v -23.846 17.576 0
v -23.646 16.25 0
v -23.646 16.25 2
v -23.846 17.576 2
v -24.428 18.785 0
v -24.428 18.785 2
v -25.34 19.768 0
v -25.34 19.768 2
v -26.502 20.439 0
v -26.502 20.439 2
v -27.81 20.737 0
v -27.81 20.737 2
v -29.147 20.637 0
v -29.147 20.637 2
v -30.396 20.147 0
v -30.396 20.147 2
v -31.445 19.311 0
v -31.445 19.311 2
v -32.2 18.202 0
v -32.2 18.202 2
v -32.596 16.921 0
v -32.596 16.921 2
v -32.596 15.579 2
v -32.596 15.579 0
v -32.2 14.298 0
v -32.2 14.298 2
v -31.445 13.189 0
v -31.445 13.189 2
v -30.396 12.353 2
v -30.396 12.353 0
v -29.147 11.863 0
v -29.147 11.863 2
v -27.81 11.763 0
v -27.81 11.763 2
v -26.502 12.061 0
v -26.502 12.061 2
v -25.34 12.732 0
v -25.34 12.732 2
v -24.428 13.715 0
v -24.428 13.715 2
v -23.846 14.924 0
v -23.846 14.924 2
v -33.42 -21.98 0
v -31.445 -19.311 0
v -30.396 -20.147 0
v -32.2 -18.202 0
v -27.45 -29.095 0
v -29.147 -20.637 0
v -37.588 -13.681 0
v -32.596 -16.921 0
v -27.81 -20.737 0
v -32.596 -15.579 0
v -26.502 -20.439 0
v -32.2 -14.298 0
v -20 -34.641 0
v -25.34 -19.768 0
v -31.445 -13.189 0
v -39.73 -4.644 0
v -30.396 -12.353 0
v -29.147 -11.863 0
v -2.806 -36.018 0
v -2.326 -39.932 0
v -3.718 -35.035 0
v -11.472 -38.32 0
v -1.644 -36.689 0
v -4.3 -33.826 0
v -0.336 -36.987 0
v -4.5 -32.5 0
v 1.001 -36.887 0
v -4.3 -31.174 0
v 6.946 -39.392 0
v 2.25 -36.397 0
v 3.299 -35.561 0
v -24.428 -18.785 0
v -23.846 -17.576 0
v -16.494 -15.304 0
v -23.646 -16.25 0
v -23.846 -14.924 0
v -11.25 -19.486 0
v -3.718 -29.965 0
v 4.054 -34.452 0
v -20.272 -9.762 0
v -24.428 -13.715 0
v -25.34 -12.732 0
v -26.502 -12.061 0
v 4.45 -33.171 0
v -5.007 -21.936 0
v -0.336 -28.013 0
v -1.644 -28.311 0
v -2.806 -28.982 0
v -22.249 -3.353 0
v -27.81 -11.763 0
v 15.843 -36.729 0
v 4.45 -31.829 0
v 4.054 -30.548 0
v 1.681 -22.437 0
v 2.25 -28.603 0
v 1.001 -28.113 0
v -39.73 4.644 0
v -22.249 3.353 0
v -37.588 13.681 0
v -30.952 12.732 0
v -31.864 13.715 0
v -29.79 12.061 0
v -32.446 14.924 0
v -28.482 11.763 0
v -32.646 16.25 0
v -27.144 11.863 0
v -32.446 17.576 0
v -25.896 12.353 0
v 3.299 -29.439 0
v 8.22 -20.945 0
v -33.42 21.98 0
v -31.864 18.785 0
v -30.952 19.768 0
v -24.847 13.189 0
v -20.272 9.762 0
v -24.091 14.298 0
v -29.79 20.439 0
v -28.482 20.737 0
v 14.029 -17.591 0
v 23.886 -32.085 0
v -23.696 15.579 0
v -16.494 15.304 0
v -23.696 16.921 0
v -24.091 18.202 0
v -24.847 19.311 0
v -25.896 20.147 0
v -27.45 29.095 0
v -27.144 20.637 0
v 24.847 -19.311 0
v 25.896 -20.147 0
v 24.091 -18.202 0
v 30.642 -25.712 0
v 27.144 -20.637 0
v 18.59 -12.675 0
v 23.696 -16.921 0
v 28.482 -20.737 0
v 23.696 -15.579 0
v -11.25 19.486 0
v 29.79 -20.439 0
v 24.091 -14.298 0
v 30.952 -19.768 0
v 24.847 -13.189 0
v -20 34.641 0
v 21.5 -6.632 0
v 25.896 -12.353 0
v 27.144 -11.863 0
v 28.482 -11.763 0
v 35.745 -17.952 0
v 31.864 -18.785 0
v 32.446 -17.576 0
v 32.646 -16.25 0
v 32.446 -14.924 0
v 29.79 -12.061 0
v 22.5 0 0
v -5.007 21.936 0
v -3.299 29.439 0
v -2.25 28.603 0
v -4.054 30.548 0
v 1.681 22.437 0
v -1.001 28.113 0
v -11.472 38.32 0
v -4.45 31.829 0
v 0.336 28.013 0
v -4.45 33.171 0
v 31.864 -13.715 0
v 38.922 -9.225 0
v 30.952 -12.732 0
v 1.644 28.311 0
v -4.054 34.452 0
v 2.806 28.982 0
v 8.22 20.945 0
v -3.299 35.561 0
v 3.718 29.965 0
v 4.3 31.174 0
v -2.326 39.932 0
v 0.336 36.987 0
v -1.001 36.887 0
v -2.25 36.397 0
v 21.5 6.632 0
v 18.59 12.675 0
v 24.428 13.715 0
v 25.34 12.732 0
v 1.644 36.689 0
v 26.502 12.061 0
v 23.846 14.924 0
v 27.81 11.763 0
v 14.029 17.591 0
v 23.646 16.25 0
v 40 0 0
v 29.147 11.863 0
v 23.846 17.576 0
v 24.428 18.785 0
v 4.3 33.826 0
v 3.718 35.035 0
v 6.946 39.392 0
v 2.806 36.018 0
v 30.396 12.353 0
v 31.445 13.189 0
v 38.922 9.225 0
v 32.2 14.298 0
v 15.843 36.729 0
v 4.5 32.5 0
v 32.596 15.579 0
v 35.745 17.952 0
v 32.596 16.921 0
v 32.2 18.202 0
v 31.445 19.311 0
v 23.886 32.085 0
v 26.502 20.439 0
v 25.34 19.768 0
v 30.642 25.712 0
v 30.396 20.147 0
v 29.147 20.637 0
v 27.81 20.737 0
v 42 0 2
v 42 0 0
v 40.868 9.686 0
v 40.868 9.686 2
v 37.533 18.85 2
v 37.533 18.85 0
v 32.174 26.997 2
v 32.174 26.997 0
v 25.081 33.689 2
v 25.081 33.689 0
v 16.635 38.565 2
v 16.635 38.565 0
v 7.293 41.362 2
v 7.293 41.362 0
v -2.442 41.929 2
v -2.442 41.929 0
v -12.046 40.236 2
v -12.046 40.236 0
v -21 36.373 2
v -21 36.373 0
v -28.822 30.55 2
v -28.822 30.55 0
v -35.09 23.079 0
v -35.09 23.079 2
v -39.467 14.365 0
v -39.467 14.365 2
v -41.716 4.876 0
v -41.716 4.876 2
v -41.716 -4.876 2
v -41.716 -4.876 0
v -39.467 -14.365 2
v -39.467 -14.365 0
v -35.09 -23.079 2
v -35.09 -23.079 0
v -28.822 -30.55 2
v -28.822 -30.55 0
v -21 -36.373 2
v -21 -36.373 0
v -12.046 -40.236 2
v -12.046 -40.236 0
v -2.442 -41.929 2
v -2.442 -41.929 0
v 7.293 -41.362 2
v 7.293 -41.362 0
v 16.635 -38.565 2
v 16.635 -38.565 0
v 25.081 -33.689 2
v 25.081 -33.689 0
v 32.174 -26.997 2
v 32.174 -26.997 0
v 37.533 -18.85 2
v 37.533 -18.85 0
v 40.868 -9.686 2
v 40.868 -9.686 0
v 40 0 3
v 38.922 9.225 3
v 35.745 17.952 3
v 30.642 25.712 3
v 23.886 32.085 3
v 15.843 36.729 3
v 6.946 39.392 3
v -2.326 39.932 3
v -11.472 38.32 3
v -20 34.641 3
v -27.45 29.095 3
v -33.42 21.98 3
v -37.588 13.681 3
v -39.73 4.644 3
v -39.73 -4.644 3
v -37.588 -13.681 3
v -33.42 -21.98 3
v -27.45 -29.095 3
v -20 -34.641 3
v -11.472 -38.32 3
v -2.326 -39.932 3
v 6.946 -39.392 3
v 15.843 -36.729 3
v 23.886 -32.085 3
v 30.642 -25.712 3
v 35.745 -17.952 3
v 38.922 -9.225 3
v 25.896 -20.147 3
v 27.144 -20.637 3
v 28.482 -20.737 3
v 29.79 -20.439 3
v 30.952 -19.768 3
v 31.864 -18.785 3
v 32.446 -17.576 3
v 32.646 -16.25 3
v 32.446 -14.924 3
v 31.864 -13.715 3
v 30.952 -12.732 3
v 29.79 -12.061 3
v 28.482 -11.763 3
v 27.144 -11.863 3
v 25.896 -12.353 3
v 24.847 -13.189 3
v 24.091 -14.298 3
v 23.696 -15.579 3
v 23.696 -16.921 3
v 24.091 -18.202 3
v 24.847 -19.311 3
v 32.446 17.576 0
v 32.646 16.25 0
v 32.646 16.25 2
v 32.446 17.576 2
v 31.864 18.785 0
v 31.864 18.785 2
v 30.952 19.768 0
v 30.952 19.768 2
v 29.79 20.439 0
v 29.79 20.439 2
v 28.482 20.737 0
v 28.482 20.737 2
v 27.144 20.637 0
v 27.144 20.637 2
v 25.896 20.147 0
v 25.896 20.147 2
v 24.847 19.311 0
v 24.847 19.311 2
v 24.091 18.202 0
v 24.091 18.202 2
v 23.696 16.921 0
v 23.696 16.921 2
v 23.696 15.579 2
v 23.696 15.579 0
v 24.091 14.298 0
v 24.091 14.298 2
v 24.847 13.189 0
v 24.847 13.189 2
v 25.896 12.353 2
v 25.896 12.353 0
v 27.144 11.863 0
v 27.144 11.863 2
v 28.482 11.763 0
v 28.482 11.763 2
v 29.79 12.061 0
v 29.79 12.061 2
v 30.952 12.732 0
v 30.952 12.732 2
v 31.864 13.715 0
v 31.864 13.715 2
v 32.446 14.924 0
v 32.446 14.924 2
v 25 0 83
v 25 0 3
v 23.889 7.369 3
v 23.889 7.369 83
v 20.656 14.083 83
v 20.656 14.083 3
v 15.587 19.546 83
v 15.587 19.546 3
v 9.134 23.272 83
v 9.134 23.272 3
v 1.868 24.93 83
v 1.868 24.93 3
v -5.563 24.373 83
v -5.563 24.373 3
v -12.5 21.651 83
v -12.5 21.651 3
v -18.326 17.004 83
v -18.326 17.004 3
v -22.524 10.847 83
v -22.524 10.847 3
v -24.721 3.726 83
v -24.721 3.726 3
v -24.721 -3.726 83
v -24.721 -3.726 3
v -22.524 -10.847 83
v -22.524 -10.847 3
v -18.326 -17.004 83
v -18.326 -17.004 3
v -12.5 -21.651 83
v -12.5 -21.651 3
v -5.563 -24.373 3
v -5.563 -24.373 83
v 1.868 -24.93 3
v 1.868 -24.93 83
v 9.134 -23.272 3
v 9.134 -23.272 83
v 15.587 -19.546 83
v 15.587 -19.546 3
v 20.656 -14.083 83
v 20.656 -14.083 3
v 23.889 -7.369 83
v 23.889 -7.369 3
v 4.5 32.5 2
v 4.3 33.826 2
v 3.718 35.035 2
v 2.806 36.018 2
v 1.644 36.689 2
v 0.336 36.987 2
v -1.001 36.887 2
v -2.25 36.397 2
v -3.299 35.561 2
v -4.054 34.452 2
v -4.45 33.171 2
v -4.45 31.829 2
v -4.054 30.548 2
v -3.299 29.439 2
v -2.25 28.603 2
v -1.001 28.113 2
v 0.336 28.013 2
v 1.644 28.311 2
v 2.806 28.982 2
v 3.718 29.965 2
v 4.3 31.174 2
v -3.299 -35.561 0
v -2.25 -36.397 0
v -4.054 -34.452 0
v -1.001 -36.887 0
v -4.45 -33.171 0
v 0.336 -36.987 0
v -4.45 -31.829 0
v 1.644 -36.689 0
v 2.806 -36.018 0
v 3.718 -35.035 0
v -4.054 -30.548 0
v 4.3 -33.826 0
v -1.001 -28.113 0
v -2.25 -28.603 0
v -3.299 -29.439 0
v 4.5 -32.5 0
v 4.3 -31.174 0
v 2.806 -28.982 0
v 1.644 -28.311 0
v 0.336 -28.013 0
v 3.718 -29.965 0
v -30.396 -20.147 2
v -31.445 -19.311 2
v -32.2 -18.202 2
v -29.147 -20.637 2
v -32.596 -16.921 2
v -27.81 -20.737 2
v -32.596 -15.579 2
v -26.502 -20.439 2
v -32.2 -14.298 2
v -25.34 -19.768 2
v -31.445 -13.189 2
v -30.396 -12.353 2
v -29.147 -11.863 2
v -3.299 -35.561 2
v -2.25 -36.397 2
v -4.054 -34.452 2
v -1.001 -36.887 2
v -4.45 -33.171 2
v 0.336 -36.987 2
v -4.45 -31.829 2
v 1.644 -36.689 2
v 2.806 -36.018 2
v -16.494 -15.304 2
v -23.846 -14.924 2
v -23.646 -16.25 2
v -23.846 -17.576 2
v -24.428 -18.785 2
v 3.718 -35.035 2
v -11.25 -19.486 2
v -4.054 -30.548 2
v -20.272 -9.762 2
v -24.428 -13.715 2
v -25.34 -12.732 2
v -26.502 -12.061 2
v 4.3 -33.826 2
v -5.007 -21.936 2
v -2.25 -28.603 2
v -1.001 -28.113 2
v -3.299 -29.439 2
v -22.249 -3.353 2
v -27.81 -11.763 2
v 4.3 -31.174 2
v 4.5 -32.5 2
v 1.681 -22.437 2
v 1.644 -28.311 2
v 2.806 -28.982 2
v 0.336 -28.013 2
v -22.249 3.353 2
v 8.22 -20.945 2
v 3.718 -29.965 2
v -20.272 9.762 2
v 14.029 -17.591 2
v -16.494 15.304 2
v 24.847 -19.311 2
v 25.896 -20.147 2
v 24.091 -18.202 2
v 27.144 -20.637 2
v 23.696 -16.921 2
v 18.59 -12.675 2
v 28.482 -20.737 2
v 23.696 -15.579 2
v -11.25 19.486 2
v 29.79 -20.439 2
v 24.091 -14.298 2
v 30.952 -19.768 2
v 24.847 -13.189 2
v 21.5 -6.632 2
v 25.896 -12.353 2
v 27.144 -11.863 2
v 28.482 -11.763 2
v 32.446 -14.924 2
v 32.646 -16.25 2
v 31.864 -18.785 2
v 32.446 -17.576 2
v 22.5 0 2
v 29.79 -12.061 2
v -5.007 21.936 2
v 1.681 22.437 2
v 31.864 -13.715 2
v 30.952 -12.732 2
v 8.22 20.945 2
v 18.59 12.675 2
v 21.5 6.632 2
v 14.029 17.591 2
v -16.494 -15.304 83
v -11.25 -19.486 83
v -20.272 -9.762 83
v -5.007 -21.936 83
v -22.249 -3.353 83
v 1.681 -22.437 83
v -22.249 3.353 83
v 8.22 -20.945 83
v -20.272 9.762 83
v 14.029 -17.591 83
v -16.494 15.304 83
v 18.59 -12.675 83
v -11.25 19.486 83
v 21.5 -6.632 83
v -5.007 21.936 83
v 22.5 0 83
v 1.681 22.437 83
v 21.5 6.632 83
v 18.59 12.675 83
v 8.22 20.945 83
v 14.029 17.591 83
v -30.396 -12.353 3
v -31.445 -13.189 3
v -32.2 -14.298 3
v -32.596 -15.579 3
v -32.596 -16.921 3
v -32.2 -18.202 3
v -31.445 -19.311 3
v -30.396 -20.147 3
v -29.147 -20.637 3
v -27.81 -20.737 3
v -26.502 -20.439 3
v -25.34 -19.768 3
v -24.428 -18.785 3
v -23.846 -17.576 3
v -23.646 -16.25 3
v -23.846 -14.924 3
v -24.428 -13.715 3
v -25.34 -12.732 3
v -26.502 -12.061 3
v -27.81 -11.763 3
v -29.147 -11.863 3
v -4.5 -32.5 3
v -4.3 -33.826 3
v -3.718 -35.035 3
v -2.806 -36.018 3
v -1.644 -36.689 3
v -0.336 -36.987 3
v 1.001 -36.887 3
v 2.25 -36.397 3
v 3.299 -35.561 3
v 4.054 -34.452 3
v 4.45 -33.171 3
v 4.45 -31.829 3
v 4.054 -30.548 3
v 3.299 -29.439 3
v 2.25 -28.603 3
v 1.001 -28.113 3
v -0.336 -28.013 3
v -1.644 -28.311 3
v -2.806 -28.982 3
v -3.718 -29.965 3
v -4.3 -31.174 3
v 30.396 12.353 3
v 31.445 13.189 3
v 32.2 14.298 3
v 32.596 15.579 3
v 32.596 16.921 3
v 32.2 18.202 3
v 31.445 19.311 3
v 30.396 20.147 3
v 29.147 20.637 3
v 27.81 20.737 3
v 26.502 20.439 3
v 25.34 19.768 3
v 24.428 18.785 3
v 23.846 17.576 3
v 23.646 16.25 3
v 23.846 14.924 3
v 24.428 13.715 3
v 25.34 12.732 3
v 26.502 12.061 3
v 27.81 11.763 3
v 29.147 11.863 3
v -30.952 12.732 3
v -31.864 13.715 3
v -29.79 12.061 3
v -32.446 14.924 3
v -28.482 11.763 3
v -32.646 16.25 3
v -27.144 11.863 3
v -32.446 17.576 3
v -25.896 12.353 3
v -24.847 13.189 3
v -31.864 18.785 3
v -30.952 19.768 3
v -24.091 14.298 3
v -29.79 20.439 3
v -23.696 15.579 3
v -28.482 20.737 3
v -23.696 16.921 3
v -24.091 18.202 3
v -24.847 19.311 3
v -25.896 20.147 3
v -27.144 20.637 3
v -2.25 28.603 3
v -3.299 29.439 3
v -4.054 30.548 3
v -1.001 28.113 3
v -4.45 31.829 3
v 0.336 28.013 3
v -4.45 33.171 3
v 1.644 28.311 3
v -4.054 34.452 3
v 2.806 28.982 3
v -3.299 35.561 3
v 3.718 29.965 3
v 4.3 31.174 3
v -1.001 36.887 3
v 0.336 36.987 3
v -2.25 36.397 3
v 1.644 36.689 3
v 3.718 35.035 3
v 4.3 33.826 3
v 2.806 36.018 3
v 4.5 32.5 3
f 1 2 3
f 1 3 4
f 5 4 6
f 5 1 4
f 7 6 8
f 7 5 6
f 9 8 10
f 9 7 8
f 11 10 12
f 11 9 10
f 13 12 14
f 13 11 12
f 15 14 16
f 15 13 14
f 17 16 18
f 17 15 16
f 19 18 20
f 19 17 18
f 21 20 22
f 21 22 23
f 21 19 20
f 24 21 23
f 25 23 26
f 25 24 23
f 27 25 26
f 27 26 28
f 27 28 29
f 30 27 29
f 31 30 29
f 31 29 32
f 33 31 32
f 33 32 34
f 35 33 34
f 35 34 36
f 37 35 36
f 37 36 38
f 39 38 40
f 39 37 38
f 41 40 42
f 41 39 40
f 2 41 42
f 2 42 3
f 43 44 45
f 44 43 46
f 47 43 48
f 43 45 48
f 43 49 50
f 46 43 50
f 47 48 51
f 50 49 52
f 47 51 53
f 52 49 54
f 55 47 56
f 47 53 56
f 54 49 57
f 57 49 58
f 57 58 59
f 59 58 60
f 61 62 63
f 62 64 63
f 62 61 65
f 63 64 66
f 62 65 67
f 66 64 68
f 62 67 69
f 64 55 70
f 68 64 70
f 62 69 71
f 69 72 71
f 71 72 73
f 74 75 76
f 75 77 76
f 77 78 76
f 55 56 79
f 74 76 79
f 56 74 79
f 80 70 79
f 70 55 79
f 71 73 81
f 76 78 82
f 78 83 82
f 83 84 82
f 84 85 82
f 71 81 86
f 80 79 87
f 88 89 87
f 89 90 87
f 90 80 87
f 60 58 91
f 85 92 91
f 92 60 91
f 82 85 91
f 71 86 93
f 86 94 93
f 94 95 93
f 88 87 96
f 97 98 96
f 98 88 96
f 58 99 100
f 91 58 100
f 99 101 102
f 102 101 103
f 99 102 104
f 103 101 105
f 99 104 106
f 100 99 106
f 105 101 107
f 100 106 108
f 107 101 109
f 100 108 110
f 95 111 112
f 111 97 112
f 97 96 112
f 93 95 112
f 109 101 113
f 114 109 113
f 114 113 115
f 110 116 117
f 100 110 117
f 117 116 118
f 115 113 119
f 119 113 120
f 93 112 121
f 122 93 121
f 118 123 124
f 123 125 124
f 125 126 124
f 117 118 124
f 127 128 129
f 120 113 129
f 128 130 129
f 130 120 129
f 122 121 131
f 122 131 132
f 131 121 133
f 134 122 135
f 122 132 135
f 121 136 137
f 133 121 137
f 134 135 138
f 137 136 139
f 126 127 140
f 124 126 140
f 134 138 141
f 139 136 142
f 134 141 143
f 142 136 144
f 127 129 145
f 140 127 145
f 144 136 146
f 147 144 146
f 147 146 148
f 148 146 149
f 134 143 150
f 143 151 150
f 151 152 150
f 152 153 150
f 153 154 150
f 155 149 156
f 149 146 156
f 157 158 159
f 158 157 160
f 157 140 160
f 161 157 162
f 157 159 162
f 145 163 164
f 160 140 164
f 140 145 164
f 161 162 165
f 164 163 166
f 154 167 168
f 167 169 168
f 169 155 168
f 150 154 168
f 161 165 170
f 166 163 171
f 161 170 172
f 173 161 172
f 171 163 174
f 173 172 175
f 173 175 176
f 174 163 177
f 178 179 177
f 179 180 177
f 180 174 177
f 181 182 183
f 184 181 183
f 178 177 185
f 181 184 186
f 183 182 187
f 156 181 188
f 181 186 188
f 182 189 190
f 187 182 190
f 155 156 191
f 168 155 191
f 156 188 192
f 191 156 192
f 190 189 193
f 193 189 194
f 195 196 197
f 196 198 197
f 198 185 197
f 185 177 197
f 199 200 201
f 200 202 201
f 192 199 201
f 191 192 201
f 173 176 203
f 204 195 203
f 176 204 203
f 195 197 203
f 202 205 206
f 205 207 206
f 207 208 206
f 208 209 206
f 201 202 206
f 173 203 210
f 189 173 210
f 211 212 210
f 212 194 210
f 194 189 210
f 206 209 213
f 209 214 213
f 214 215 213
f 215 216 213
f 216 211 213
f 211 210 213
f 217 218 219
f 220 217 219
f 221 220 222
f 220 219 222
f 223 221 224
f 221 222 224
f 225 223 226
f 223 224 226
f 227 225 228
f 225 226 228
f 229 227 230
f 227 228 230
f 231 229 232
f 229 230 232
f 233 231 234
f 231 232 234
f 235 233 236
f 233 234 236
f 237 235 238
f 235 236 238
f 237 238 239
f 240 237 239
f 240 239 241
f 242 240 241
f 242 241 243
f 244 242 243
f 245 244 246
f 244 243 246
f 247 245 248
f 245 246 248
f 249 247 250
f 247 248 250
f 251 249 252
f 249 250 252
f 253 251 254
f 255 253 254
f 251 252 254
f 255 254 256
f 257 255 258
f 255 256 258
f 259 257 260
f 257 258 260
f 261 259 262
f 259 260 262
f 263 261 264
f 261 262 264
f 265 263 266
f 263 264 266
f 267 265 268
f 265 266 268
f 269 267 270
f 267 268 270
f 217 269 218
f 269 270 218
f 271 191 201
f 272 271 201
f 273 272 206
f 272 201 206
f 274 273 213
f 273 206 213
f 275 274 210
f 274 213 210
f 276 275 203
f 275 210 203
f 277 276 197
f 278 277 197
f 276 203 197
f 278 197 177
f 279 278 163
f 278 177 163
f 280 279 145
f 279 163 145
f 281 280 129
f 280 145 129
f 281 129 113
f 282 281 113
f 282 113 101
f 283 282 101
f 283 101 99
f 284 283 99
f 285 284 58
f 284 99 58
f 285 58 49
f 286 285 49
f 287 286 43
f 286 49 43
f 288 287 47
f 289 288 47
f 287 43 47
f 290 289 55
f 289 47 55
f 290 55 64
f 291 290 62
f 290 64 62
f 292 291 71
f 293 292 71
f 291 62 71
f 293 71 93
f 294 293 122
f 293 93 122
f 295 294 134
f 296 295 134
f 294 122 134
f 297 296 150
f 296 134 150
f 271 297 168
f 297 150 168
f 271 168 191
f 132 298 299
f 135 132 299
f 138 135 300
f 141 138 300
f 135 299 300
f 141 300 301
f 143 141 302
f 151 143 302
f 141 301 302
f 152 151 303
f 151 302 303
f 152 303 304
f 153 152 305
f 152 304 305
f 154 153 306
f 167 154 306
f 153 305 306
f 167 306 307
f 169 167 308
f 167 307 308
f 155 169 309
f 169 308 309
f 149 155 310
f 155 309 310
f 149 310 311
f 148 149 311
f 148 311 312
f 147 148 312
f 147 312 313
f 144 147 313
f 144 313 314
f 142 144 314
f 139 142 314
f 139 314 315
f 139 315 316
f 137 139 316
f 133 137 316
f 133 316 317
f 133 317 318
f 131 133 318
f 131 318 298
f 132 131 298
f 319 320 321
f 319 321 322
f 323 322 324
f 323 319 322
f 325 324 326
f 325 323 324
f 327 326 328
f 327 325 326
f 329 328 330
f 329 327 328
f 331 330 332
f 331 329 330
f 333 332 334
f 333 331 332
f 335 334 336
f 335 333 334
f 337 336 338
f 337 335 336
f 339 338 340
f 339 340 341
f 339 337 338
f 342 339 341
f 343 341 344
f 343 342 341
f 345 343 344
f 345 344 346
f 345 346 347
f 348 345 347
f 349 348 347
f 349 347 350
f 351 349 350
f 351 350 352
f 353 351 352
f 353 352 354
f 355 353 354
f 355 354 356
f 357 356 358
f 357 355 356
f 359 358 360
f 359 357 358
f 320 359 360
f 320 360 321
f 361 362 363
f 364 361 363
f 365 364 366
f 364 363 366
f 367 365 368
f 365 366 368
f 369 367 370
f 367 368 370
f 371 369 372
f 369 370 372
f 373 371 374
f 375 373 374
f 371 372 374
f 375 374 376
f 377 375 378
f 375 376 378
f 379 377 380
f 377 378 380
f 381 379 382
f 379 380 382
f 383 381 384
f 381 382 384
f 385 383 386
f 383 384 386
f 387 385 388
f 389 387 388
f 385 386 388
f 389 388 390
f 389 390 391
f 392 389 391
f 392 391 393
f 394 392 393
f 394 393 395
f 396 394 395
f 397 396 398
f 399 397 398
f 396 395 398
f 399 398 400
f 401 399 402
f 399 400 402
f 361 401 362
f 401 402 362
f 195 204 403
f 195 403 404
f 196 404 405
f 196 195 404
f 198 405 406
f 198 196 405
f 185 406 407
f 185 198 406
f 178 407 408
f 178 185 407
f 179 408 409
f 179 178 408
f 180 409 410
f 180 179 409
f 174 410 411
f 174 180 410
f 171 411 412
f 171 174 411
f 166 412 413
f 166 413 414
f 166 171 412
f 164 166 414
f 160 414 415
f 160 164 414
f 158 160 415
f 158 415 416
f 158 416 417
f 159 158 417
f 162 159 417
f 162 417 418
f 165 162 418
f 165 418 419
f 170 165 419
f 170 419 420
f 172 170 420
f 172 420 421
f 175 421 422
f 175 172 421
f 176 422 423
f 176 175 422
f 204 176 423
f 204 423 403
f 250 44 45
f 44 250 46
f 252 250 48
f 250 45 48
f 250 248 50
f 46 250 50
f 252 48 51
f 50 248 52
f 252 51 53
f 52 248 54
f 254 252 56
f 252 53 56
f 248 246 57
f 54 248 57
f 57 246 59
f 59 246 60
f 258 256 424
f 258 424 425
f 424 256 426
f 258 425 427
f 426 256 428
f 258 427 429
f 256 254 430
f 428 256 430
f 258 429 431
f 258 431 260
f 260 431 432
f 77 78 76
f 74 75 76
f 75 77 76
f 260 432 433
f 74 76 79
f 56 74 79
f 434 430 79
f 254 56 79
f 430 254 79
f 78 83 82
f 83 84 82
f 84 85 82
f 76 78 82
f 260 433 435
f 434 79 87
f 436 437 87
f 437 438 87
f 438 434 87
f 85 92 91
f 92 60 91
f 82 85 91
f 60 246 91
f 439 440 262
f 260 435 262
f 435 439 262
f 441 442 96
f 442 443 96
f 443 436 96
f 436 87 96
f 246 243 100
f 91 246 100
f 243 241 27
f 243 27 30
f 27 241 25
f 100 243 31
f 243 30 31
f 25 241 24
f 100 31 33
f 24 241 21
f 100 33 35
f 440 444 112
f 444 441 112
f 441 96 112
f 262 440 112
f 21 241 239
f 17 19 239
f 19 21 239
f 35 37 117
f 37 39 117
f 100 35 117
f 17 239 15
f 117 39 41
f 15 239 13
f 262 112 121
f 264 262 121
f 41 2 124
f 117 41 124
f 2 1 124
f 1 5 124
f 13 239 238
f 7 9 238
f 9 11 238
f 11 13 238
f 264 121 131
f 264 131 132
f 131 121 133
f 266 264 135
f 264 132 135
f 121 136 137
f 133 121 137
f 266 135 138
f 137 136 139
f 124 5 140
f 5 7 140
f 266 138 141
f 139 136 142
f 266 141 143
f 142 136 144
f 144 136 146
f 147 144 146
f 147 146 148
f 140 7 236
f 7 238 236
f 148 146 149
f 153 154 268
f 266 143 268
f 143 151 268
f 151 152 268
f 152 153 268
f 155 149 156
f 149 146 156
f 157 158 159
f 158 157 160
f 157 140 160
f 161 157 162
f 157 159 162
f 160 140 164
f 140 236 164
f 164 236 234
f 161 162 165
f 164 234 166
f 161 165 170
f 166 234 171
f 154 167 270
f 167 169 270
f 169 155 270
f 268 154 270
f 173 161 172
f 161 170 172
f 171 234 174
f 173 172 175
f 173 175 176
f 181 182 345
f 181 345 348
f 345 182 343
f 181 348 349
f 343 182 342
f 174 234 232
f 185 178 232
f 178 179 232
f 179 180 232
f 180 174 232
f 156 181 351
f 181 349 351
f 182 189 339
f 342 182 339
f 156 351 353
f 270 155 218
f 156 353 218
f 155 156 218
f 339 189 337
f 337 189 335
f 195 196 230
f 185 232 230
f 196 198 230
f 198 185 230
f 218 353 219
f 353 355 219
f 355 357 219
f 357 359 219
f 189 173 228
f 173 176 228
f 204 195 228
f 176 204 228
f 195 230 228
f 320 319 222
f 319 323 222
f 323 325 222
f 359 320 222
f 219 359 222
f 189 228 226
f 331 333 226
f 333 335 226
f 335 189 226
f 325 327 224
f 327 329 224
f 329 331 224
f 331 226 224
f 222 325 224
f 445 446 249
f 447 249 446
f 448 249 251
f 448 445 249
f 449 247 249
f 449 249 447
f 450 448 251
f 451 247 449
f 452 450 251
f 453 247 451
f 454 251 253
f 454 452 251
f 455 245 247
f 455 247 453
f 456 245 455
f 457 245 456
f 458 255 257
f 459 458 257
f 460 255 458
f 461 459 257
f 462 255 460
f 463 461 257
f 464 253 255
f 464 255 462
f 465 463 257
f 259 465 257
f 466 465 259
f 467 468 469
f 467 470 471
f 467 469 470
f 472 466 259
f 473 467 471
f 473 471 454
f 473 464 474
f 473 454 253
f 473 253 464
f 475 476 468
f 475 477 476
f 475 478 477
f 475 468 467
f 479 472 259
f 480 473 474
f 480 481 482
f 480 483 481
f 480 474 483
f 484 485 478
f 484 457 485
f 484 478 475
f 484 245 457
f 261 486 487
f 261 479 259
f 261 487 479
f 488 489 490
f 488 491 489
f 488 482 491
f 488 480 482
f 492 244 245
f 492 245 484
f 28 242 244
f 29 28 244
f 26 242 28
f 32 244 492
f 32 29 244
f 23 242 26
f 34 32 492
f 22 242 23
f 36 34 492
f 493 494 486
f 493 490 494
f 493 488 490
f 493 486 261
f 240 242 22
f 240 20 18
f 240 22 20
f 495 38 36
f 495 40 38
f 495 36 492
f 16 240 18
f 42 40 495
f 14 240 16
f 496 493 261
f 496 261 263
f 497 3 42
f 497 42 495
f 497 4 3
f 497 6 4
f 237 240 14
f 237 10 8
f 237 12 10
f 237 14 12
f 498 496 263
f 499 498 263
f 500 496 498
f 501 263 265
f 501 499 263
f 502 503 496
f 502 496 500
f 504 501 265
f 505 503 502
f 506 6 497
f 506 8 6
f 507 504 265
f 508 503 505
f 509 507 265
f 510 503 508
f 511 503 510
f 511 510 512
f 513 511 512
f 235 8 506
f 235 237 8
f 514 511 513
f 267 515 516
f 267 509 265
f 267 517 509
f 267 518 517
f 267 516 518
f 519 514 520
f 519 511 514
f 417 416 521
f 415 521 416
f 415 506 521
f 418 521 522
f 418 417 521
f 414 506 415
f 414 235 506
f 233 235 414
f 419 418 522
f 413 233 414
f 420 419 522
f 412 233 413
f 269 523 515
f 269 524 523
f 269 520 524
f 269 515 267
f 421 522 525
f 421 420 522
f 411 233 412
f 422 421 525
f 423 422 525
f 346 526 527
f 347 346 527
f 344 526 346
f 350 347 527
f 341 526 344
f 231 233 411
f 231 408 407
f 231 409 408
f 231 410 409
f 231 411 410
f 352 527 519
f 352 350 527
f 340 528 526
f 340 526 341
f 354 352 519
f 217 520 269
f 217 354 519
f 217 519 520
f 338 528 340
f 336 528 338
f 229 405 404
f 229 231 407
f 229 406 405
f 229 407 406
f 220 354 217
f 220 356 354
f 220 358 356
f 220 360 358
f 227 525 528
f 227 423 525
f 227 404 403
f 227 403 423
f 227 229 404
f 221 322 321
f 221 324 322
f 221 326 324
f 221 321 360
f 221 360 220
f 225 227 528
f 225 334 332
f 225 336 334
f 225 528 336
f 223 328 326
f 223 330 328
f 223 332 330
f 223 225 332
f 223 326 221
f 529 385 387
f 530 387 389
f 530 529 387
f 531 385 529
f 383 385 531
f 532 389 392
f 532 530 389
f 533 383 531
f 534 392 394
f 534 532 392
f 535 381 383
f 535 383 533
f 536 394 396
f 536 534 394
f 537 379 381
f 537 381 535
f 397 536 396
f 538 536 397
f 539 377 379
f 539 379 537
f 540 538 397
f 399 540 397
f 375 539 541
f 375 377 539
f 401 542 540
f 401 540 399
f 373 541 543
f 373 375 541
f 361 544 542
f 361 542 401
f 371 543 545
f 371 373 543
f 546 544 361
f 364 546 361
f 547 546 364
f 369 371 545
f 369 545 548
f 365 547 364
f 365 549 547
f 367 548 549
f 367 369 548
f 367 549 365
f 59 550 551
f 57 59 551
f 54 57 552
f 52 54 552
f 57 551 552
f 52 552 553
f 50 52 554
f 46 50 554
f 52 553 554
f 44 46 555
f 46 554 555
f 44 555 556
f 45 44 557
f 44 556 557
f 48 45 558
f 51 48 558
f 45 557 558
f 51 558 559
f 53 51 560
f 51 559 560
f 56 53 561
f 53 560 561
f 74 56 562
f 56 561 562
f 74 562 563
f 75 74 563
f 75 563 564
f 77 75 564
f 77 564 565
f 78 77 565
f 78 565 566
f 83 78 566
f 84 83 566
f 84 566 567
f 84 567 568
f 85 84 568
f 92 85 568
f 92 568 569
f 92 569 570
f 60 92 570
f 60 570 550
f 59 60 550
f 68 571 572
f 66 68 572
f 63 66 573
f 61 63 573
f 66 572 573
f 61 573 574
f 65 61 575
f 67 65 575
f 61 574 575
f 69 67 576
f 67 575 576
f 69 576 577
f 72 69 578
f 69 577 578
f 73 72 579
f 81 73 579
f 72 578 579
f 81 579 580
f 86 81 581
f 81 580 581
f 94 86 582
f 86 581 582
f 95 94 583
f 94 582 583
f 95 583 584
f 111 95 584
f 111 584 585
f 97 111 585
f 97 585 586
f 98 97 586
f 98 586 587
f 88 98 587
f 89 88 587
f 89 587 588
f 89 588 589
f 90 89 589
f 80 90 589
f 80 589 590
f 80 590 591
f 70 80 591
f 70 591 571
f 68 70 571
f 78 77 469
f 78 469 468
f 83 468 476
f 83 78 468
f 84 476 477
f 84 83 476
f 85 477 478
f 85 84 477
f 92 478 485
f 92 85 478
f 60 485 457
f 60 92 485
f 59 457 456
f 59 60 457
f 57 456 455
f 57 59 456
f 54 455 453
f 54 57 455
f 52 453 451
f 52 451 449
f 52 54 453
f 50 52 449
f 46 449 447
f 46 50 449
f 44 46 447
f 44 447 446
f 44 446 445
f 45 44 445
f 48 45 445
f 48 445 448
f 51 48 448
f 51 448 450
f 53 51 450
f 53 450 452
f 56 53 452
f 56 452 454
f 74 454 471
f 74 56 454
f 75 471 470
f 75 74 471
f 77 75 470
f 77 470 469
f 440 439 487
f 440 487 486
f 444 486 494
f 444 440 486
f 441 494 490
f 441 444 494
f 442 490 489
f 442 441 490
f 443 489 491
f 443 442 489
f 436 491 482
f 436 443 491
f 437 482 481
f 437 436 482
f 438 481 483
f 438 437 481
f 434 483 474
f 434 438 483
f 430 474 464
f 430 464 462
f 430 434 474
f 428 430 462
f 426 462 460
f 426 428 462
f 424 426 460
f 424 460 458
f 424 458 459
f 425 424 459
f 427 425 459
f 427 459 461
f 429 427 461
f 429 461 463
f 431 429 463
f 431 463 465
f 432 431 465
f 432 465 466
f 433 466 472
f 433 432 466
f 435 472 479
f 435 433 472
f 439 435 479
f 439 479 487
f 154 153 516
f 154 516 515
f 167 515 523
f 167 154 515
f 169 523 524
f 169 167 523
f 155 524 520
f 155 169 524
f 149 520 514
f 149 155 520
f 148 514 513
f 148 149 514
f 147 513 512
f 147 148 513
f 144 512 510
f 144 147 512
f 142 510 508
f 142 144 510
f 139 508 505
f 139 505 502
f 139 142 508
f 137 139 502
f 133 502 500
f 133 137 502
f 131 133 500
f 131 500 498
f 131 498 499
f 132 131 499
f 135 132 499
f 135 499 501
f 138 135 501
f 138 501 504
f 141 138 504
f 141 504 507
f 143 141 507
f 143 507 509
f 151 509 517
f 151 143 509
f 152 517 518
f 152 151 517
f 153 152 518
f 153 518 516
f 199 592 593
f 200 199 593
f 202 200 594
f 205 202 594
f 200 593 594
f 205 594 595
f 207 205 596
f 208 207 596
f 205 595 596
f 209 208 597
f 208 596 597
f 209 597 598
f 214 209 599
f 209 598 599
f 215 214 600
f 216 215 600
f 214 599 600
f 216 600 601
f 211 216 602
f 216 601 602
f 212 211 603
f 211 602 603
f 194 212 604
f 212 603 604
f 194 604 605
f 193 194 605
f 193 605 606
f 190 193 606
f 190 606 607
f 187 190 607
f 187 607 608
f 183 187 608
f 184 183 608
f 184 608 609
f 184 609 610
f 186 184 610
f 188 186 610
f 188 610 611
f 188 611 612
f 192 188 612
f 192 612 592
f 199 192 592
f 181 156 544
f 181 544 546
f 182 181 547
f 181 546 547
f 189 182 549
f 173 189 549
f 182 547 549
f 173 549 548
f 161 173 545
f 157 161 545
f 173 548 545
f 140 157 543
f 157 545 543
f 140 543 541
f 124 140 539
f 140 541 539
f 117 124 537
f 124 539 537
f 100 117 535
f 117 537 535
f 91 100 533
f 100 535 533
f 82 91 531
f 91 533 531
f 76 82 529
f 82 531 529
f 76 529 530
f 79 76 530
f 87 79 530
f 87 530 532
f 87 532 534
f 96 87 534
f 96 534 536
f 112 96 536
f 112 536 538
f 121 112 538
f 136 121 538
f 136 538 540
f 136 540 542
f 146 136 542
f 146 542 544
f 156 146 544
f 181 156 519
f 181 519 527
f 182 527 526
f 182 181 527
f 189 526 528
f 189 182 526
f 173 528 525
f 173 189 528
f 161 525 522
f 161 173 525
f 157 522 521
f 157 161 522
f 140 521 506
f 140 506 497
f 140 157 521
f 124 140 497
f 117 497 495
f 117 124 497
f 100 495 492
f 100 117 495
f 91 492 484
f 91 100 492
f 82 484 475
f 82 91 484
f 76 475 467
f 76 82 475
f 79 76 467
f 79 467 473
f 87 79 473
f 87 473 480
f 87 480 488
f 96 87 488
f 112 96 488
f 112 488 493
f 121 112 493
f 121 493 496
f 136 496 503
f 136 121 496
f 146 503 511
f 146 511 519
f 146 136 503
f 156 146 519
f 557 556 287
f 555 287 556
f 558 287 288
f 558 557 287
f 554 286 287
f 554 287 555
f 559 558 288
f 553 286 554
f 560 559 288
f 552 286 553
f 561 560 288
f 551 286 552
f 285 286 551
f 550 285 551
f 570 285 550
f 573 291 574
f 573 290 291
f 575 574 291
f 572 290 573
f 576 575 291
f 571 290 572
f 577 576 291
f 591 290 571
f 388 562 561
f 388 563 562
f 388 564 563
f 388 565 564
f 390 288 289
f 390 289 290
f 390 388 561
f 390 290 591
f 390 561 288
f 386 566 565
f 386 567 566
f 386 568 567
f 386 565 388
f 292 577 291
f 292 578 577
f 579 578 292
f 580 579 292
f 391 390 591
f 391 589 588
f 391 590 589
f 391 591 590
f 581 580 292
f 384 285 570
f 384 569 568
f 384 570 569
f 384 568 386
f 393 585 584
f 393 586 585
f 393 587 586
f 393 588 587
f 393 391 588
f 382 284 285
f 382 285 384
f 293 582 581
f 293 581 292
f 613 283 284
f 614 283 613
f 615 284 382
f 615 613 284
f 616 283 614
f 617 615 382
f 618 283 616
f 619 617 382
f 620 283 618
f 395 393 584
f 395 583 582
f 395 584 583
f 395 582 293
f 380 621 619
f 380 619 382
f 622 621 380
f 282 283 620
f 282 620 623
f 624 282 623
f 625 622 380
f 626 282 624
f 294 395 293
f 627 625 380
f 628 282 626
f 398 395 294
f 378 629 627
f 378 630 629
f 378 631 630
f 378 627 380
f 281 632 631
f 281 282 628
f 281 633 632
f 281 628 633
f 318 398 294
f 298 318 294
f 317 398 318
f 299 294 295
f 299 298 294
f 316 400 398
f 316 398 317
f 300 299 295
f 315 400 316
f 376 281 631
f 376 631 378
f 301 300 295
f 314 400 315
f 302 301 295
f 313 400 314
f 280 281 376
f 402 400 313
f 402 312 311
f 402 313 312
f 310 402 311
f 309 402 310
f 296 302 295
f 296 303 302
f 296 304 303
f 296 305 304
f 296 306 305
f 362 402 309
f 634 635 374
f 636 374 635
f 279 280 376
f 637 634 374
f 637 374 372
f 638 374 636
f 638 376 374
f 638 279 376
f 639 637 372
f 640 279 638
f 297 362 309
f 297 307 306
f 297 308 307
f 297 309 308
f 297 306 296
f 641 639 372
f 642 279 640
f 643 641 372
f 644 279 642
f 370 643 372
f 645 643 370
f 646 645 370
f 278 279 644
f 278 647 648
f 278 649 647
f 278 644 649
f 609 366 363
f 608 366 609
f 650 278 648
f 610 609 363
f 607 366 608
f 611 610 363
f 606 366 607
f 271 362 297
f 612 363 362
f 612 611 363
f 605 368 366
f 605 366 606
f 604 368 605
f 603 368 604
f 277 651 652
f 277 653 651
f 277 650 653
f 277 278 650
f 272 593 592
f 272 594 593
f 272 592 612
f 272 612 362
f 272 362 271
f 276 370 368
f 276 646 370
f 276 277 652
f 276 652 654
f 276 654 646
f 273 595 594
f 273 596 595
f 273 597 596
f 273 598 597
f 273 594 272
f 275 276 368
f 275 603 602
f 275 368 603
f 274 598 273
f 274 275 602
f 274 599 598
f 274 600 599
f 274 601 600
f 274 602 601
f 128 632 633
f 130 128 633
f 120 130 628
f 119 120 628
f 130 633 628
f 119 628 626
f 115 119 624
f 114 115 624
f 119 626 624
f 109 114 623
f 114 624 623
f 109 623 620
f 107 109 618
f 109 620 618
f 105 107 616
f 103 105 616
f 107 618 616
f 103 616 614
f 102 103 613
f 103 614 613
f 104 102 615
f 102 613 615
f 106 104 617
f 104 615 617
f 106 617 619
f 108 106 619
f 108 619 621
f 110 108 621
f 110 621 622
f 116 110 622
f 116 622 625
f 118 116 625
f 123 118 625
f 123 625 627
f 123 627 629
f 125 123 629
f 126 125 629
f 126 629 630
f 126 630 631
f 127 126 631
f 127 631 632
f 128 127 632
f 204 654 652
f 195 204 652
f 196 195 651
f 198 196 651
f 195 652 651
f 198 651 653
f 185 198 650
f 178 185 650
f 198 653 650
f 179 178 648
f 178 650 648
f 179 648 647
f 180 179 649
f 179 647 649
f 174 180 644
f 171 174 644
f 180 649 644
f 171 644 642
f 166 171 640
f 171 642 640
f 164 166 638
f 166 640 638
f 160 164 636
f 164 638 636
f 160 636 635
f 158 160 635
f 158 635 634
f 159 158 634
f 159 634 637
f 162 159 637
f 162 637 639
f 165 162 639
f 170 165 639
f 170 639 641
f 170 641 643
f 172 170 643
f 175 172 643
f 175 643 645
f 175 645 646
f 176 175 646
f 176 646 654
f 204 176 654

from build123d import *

# Parameters (mm, degrees)
SKETCH_R           = 40
PAD_DEPTH          = 3
SKETCH001_R        = 25
PAD001_DEPTH       = 80
SKETCH002_R        = 22.5
POCKET_DEPTH       = 83.001
SKETCH003_R        = 4.5
POCKET001_DEPTH    = 283.635994
POLARPATTERN_COUNT = 6
SKETCH004_R        = 42
SKETCH004_R_2      = 22.5
SKETCH004_R_3      = 4.5
PAD002_DEPTH       = 2


with BuildPart() as pipe:
    # Sketch → Pad (new body)
    with BuildSketch(Plane.XY):
        Circle(SKETCH_R)
    extrude(amount=PAD_DEPTH)

    # Sketch001 (on Face3 of Pad) → Pad001 (join)
    with BuildSketch(Plane.XY.offset(3)):
        Circle(SKETCH001_R)
    extrude(amount=PAD001_DEPTH)

    # Sketch002 (on Face5 of Pad001) → Pocket (cut, through all)
    with BuildSketch(Plane.XY.offset(83)):
        Circle(SKETCH002_R)
    extrude(amount=-POCKET_DEPTH, mode=Mode.SUBTRACT)

    # Sketch003 (on Face3 of Pocket) → Pocket001 (cut, through all)
    with BuildSketch(Plane.XY.offset(3)):
        with Locations((0, 32.5)):
            Circle(SKETCH003_R)
    pocket001 = extrude(amount=-POCKET001_DEPTH, mode=Mode.SUBTRACT)

    # PolarPattern: Pocket001 ×6 about axis
    polarpattern_axis = Axis((0, 0, 3), (0, 0, 1))
    for i in range(1, POLARPATTERN_COUNT):
        add(pocket001.rotate(polarpattern_axis, i * 360 / POLARPATTERN_COUNT), mode=Mode.SUBTRACT)


with BuildPart() as gasket:
    # Sketch004 → Pad002 (new body)
    with BuildSketch(Plane.XY):
        Circle(SKETCH004_R)
        Circle(SKETCH004_R_2, mode=Mode.SUBTRACT)
        with Locations((0, 32.5)):
            Circle(SKETCH004_R_3, mode=Mode.SUBTRACT)
        with Locations((28.145826, -16.25)):
            Circle(SKETCH004_R_3, mode=Mode.SUBTRACT)
        with Locations((-28.145826, -16.25)):
            Circle(SKETCH004_R_3, mode=Mode.SUBTRACT)
        with Locations((28.145826, 16.25)):
            Circle(SKETCH004_R_3, mode=Mode.SUBTRACT)
        with Locations((-28.145826, 16.25)):
            Circle(SKETCH004_R_3, mode=Mode.SUBTRACT)
        with Locations((0, -32.5)):
            Circle(SKETCH004_R_3, mode=Mode.SUBTRACT)
    extrude(amount=PAD002_DEPTH)


solid = Compound([pipe.part, gasket.part])
